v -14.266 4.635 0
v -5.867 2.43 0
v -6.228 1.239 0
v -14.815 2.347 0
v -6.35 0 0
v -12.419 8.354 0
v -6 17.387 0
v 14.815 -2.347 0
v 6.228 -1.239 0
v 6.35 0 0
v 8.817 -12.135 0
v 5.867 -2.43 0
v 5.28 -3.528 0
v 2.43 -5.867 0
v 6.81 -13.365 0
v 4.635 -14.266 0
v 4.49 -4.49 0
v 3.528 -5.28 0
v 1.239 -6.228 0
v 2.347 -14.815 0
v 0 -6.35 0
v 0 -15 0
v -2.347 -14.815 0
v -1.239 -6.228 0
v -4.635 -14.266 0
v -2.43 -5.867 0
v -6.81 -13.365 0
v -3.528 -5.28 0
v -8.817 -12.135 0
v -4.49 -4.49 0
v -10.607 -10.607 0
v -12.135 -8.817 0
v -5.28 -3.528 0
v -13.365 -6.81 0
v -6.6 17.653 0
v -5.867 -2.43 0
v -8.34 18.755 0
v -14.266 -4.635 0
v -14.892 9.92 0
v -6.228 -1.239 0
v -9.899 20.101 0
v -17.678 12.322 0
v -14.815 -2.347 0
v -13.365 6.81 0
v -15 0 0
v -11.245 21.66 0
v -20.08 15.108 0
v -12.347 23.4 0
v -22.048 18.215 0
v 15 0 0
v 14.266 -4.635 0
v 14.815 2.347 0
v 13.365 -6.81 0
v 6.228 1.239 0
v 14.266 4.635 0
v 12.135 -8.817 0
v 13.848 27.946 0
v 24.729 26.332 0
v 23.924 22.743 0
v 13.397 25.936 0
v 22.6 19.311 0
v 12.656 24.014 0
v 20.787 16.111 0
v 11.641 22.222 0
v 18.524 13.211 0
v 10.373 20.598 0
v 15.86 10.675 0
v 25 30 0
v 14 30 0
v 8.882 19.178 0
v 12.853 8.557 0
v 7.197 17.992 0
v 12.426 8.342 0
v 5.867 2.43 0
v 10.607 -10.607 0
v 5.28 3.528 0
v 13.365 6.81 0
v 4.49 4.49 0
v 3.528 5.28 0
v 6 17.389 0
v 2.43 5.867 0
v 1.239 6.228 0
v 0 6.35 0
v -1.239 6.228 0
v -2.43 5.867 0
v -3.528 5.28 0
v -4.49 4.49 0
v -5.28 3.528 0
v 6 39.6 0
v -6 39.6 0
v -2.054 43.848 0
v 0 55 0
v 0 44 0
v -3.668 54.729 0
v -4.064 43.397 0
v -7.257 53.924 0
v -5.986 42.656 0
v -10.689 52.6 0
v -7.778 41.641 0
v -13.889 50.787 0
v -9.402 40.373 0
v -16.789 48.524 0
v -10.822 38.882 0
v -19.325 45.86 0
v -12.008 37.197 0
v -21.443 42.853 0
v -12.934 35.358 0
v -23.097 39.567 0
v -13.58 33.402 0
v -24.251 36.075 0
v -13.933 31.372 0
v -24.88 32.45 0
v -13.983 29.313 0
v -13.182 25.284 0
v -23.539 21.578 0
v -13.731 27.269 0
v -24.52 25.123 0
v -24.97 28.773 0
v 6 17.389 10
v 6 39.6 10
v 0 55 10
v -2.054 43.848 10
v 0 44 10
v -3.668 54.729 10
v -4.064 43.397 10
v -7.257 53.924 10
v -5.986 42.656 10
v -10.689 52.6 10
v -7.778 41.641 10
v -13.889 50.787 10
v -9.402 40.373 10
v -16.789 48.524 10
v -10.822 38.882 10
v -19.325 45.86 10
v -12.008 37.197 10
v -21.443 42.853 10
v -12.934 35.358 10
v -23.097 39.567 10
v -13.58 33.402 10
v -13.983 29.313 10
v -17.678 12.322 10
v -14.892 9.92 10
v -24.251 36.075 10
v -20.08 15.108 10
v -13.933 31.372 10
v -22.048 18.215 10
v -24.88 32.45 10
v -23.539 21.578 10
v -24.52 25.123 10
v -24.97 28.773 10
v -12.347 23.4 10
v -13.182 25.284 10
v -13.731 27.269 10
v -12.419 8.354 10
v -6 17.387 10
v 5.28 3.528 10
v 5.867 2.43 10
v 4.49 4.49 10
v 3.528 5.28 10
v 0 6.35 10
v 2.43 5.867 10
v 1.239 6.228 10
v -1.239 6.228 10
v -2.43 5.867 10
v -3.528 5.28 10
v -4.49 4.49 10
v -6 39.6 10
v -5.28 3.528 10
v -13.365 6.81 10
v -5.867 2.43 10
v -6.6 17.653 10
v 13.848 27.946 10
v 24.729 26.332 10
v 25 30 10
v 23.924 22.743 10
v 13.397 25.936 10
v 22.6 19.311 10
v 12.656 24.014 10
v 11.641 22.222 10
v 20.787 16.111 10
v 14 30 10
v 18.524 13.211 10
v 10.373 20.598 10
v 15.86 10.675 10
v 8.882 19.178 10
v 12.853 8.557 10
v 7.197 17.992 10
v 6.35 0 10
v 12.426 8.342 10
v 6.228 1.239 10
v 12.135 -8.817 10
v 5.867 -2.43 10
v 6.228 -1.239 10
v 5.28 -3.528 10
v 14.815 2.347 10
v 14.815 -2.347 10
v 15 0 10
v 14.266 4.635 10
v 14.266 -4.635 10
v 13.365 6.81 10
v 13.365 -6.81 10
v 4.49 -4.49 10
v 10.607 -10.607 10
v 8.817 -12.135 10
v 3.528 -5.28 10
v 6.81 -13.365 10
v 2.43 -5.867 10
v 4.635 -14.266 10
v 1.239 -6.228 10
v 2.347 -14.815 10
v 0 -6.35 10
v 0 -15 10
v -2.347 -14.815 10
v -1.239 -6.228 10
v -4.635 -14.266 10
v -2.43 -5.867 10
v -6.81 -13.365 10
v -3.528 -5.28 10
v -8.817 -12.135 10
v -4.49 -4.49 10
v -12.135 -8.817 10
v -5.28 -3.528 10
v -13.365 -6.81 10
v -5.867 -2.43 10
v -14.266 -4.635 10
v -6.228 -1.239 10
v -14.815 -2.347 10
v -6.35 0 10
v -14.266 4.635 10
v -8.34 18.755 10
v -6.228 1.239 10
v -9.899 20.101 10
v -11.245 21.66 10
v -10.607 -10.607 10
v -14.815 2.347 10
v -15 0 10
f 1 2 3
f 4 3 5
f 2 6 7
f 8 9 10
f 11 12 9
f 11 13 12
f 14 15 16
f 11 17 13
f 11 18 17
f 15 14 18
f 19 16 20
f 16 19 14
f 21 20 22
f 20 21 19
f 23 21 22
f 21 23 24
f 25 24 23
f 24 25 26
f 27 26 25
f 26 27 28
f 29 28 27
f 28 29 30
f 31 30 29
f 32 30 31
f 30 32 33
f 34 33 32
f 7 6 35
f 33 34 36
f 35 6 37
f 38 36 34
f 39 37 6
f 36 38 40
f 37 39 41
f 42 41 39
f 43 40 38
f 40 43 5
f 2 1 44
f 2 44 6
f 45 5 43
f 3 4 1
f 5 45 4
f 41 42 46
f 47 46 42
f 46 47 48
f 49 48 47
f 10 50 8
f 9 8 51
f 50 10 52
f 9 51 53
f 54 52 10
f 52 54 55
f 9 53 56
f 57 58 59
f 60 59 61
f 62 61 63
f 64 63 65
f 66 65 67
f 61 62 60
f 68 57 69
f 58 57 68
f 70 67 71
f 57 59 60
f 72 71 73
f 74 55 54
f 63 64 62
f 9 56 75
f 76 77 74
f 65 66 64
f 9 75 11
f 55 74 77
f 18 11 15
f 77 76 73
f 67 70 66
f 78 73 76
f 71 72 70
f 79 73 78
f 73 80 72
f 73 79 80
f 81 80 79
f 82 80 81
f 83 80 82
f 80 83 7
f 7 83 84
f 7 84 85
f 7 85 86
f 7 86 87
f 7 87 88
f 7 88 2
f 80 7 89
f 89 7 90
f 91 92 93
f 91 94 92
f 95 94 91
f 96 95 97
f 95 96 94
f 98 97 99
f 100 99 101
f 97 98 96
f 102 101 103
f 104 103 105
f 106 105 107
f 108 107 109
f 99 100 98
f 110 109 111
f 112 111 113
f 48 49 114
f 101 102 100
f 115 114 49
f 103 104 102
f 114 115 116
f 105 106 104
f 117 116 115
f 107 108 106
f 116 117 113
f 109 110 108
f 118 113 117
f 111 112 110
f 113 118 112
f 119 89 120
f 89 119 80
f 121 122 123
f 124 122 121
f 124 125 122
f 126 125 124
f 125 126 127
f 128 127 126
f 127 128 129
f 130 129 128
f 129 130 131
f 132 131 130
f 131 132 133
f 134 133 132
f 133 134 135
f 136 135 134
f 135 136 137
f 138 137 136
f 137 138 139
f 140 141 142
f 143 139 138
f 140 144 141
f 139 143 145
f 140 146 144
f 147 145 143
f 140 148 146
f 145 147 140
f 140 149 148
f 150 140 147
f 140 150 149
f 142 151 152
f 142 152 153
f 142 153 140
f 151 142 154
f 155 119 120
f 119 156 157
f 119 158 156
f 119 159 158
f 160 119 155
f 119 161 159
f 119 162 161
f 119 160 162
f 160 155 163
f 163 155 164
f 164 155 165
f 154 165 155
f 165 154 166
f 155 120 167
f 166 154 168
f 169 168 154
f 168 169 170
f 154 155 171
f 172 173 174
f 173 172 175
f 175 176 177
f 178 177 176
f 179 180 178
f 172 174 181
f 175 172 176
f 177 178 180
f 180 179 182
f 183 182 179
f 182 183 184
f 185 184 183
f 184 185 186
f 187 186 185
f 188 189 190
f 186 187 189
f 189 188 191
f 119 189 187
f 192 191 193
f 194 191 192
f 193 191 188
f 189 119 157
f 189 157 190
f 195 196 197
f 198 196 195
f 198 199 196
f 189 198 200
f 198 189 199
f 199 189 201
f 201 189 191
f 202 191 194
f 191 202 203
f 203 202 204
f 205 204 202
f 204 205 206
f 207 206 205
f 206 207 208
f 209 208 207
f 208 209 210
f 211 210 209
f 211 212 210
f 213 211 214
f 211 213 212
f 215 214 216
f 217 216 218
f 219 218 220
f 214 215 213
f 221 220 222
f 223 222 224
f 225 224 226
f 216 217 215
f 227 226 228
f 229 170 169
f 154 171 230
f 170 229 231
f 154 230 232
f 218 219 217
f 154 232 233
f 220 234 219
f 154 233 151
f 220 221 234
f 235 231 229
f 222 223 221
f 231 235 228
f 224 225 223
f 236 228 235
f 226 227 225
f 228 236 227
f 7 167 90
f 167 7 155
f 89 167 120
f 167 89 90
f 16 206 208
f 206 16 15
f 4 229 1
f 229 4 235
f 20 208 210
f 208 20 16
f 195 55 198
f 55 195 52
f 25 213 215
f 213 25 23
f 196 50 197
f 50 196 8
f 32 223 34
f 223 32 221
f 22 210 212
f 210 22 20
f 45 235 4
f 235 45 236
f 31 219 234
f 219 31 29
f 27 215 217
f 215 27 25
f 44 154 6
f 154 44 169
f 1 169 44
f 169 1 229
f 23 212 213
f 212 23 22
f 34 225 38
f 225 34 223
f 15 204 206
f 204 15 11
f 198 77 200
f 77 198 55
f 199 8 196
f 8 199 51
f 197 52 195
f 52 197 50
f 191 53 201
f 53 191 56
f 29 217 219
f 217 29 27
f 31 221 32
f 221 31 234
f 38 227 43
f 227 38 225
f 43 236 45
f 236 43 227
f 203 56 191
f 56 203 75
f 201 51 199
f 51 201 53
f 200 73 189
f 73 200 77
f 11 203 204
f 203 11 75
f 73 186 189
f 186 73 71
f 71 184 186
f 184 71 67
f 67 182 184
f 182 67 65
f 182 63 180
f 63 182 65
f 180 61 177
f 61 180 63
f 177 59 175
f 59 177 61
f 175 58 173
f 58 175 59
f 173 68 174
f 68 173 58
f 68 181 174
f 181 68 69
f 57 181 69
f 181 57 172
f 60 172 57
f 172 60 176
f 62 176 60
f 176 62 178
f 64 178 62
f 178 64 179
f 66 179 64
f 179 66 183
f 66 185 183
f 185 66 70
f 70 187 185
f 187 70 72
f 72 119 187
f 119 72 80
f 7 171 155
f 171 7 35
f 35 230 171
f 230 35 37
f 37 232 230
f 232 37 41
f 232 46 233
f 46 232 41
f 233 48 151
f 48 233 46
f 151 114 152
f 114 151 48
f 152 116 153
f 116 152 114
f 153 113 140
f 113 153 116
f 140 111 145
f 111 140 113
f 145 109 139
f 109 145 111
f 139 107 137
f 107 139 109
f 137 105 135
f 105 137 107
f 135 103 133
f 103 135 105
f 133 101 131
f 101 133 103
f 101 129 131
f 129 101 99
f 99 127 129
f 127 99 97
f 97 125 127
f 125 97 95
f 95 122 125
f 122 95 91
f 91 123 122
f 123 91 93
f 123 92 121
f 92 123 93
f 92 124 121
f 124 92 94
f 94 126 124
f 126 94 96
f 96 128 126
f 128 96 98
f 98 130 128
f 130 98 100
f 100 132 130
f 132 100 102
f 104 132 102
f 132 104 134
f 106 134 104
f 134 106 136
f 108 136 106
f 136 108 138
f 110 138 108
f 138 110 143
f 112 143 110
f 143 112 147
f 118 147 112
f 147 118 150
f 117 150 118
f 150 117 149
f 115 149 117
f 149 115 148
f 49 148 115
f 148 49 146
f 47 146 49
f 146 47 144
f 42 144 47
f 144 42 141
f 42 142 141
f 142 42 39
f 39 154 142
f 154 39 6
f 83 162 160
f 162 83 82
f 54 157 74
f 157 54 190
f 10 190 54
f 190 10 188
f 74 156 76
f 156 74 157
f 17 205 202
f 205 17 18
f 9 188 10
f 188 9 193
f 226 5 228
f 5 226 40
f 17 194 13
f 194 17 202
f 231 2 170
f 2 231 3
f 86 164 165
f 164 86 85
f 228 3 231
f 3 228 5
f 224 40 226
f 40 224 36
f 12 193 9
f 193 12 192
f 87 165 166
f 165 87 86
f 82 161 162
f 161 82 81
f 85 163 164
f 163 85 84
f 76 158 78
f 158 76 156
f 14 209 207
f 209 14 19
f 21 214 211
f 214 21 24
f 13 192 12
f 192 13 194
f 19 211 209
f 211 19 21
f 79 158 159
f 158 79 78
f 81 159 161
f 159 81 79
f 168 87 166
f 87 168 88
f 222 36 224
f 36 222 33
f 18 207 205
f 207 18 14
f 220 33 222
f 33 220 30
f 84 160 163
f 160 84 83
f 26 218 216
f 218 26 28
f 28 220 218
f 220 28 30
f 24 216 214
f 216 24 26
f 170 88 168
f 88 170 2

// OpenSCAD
$fn = 32;

// ----------------------------------------------------------------------
// Hook: 60 mm shank into a 14 mm curl, 10 mm thick
// ----------------------------------------------------------------------

// --- parameters (mm) ---
shank_len = 60;           // shank length from the boss centre
shank_w = 12;             // shank width
boss_d = 30;              // boss diameter
bore_d = 12.7;            // boss bore
curl_in = 14;             // curl inner radius
curl_out = 25;            // curl outer radius
curl_sweep = 270;         // curl sweep angle
hook_t = 10;              // hook thickness

shank_profile = [[-6, 39.6], [6, 39.6], [6, 13], [-6, 13]];
boss_profile = [[15, 0], [14.815, 2.347], [14.266, 4.635], [13.365, 6.81], [12.135, 8.817], [10.607, 10.607], [8.817, 12.135], [6.81, 13.365], [4.635, 14.266], [2.347, 14.815], [0, 15], [-2.347, 14.815], [-4.635, 14.266], [-6.81, 13.365], [-8.817, 12.135], [-10.607, 10.607], [-12.135, 8.817], [-13.365, 6.81], [-14.266, 4.635], [-14.815, 2.347], [-15, 0], [-14.815, -2.347], [-14.266, -4.635], [-13.365, -6.81], [-12.135, -8.817], [-10.607, -10.607], [-8.817, -12.135], [-6.81, -13.365], [-4.635, -14.266], [-2.347, -14.815], [0, -15], [2.347, -14.815], [4.635, -14.266], [6.81, -13.365], [8.817, -12.135], [10.607, -10.607], [12.135, -8.817], [13.365, -6.81], [14.266, -4.635], [14.815, -2.347]];
curl_profile = [[0, 55], [-3.668, 54.729], [-7.257, 53.924], [-10.689, 52.6], [-13.889, 50.787], [-16.789, 48.524], [-19.325, 45.86], [-21.443, 42.853], [-23.097, 39.567], [-24.251, 36.075], [-24.88, 32.45], [-24.97, 28.773], [-24.52, 25.123], [-23.539, 21.578], [-22.048, 18.215], [-20.08, 15.108], [-17.678, 12.322], [-14.892, 9.92], [-11.785, 7.952], [-8.422, 6.461], [-4.877, 5.48], [-1.227, 5.03], [2.45, 5.12], [6.075, 5.749], [9.567, 6.903], [12.853, 8.557], [15.86, 10.675], [18.524, 13.211], [20.787, 16.111], [22.6, 19.311], [23.924, 22.743], [24.729, 26.332], [25, 30], [14, 30], [13.848, 27.946], [13.397, 25.936], [12.656, 24.014], [11.641, 22.222], [10.373, 20.598], [8.882, 19.178], [7.197, 17.992], [5.358, 17.066], [3.402, 16.42], [1.372, 16.067], [-0.687, 16.017], [-2.731, 16.269], [-4.716, 16.818], [-6.6, 17.653], [-8.34, 18.755], [-9.899, 20.101], [-11.245, 21.66], [-12.347, 23.4], [-13.182, 25.284], [-13.731, 27.269], [-13.983, 29.313], [-13.933, 31.372], [-13.58, 33.402], [-12.934, 35.358], [-12.008, 37.197], [-10.822, 38.882], [-9.402, 40.373], [-7.778, 41.641], [-5.986, 42.656], [-4.064, 43.397], [-2.054, 43.848], [0, 44]];

difference() {
  union() {
    /* three overlapping outlines: shank, boss and the smooth curl */
    linear_extrude(height = hook_t) polygon(shank_profile);
    linear_extrude(height = hook_t) polygon(boss_profile);
    linear_extrude(height = hook_t) polygon(curl_profile);
  }
  translate([0, 0, -2.5]) cylinder(h = hook_t + 5, d = bore_d);
}
